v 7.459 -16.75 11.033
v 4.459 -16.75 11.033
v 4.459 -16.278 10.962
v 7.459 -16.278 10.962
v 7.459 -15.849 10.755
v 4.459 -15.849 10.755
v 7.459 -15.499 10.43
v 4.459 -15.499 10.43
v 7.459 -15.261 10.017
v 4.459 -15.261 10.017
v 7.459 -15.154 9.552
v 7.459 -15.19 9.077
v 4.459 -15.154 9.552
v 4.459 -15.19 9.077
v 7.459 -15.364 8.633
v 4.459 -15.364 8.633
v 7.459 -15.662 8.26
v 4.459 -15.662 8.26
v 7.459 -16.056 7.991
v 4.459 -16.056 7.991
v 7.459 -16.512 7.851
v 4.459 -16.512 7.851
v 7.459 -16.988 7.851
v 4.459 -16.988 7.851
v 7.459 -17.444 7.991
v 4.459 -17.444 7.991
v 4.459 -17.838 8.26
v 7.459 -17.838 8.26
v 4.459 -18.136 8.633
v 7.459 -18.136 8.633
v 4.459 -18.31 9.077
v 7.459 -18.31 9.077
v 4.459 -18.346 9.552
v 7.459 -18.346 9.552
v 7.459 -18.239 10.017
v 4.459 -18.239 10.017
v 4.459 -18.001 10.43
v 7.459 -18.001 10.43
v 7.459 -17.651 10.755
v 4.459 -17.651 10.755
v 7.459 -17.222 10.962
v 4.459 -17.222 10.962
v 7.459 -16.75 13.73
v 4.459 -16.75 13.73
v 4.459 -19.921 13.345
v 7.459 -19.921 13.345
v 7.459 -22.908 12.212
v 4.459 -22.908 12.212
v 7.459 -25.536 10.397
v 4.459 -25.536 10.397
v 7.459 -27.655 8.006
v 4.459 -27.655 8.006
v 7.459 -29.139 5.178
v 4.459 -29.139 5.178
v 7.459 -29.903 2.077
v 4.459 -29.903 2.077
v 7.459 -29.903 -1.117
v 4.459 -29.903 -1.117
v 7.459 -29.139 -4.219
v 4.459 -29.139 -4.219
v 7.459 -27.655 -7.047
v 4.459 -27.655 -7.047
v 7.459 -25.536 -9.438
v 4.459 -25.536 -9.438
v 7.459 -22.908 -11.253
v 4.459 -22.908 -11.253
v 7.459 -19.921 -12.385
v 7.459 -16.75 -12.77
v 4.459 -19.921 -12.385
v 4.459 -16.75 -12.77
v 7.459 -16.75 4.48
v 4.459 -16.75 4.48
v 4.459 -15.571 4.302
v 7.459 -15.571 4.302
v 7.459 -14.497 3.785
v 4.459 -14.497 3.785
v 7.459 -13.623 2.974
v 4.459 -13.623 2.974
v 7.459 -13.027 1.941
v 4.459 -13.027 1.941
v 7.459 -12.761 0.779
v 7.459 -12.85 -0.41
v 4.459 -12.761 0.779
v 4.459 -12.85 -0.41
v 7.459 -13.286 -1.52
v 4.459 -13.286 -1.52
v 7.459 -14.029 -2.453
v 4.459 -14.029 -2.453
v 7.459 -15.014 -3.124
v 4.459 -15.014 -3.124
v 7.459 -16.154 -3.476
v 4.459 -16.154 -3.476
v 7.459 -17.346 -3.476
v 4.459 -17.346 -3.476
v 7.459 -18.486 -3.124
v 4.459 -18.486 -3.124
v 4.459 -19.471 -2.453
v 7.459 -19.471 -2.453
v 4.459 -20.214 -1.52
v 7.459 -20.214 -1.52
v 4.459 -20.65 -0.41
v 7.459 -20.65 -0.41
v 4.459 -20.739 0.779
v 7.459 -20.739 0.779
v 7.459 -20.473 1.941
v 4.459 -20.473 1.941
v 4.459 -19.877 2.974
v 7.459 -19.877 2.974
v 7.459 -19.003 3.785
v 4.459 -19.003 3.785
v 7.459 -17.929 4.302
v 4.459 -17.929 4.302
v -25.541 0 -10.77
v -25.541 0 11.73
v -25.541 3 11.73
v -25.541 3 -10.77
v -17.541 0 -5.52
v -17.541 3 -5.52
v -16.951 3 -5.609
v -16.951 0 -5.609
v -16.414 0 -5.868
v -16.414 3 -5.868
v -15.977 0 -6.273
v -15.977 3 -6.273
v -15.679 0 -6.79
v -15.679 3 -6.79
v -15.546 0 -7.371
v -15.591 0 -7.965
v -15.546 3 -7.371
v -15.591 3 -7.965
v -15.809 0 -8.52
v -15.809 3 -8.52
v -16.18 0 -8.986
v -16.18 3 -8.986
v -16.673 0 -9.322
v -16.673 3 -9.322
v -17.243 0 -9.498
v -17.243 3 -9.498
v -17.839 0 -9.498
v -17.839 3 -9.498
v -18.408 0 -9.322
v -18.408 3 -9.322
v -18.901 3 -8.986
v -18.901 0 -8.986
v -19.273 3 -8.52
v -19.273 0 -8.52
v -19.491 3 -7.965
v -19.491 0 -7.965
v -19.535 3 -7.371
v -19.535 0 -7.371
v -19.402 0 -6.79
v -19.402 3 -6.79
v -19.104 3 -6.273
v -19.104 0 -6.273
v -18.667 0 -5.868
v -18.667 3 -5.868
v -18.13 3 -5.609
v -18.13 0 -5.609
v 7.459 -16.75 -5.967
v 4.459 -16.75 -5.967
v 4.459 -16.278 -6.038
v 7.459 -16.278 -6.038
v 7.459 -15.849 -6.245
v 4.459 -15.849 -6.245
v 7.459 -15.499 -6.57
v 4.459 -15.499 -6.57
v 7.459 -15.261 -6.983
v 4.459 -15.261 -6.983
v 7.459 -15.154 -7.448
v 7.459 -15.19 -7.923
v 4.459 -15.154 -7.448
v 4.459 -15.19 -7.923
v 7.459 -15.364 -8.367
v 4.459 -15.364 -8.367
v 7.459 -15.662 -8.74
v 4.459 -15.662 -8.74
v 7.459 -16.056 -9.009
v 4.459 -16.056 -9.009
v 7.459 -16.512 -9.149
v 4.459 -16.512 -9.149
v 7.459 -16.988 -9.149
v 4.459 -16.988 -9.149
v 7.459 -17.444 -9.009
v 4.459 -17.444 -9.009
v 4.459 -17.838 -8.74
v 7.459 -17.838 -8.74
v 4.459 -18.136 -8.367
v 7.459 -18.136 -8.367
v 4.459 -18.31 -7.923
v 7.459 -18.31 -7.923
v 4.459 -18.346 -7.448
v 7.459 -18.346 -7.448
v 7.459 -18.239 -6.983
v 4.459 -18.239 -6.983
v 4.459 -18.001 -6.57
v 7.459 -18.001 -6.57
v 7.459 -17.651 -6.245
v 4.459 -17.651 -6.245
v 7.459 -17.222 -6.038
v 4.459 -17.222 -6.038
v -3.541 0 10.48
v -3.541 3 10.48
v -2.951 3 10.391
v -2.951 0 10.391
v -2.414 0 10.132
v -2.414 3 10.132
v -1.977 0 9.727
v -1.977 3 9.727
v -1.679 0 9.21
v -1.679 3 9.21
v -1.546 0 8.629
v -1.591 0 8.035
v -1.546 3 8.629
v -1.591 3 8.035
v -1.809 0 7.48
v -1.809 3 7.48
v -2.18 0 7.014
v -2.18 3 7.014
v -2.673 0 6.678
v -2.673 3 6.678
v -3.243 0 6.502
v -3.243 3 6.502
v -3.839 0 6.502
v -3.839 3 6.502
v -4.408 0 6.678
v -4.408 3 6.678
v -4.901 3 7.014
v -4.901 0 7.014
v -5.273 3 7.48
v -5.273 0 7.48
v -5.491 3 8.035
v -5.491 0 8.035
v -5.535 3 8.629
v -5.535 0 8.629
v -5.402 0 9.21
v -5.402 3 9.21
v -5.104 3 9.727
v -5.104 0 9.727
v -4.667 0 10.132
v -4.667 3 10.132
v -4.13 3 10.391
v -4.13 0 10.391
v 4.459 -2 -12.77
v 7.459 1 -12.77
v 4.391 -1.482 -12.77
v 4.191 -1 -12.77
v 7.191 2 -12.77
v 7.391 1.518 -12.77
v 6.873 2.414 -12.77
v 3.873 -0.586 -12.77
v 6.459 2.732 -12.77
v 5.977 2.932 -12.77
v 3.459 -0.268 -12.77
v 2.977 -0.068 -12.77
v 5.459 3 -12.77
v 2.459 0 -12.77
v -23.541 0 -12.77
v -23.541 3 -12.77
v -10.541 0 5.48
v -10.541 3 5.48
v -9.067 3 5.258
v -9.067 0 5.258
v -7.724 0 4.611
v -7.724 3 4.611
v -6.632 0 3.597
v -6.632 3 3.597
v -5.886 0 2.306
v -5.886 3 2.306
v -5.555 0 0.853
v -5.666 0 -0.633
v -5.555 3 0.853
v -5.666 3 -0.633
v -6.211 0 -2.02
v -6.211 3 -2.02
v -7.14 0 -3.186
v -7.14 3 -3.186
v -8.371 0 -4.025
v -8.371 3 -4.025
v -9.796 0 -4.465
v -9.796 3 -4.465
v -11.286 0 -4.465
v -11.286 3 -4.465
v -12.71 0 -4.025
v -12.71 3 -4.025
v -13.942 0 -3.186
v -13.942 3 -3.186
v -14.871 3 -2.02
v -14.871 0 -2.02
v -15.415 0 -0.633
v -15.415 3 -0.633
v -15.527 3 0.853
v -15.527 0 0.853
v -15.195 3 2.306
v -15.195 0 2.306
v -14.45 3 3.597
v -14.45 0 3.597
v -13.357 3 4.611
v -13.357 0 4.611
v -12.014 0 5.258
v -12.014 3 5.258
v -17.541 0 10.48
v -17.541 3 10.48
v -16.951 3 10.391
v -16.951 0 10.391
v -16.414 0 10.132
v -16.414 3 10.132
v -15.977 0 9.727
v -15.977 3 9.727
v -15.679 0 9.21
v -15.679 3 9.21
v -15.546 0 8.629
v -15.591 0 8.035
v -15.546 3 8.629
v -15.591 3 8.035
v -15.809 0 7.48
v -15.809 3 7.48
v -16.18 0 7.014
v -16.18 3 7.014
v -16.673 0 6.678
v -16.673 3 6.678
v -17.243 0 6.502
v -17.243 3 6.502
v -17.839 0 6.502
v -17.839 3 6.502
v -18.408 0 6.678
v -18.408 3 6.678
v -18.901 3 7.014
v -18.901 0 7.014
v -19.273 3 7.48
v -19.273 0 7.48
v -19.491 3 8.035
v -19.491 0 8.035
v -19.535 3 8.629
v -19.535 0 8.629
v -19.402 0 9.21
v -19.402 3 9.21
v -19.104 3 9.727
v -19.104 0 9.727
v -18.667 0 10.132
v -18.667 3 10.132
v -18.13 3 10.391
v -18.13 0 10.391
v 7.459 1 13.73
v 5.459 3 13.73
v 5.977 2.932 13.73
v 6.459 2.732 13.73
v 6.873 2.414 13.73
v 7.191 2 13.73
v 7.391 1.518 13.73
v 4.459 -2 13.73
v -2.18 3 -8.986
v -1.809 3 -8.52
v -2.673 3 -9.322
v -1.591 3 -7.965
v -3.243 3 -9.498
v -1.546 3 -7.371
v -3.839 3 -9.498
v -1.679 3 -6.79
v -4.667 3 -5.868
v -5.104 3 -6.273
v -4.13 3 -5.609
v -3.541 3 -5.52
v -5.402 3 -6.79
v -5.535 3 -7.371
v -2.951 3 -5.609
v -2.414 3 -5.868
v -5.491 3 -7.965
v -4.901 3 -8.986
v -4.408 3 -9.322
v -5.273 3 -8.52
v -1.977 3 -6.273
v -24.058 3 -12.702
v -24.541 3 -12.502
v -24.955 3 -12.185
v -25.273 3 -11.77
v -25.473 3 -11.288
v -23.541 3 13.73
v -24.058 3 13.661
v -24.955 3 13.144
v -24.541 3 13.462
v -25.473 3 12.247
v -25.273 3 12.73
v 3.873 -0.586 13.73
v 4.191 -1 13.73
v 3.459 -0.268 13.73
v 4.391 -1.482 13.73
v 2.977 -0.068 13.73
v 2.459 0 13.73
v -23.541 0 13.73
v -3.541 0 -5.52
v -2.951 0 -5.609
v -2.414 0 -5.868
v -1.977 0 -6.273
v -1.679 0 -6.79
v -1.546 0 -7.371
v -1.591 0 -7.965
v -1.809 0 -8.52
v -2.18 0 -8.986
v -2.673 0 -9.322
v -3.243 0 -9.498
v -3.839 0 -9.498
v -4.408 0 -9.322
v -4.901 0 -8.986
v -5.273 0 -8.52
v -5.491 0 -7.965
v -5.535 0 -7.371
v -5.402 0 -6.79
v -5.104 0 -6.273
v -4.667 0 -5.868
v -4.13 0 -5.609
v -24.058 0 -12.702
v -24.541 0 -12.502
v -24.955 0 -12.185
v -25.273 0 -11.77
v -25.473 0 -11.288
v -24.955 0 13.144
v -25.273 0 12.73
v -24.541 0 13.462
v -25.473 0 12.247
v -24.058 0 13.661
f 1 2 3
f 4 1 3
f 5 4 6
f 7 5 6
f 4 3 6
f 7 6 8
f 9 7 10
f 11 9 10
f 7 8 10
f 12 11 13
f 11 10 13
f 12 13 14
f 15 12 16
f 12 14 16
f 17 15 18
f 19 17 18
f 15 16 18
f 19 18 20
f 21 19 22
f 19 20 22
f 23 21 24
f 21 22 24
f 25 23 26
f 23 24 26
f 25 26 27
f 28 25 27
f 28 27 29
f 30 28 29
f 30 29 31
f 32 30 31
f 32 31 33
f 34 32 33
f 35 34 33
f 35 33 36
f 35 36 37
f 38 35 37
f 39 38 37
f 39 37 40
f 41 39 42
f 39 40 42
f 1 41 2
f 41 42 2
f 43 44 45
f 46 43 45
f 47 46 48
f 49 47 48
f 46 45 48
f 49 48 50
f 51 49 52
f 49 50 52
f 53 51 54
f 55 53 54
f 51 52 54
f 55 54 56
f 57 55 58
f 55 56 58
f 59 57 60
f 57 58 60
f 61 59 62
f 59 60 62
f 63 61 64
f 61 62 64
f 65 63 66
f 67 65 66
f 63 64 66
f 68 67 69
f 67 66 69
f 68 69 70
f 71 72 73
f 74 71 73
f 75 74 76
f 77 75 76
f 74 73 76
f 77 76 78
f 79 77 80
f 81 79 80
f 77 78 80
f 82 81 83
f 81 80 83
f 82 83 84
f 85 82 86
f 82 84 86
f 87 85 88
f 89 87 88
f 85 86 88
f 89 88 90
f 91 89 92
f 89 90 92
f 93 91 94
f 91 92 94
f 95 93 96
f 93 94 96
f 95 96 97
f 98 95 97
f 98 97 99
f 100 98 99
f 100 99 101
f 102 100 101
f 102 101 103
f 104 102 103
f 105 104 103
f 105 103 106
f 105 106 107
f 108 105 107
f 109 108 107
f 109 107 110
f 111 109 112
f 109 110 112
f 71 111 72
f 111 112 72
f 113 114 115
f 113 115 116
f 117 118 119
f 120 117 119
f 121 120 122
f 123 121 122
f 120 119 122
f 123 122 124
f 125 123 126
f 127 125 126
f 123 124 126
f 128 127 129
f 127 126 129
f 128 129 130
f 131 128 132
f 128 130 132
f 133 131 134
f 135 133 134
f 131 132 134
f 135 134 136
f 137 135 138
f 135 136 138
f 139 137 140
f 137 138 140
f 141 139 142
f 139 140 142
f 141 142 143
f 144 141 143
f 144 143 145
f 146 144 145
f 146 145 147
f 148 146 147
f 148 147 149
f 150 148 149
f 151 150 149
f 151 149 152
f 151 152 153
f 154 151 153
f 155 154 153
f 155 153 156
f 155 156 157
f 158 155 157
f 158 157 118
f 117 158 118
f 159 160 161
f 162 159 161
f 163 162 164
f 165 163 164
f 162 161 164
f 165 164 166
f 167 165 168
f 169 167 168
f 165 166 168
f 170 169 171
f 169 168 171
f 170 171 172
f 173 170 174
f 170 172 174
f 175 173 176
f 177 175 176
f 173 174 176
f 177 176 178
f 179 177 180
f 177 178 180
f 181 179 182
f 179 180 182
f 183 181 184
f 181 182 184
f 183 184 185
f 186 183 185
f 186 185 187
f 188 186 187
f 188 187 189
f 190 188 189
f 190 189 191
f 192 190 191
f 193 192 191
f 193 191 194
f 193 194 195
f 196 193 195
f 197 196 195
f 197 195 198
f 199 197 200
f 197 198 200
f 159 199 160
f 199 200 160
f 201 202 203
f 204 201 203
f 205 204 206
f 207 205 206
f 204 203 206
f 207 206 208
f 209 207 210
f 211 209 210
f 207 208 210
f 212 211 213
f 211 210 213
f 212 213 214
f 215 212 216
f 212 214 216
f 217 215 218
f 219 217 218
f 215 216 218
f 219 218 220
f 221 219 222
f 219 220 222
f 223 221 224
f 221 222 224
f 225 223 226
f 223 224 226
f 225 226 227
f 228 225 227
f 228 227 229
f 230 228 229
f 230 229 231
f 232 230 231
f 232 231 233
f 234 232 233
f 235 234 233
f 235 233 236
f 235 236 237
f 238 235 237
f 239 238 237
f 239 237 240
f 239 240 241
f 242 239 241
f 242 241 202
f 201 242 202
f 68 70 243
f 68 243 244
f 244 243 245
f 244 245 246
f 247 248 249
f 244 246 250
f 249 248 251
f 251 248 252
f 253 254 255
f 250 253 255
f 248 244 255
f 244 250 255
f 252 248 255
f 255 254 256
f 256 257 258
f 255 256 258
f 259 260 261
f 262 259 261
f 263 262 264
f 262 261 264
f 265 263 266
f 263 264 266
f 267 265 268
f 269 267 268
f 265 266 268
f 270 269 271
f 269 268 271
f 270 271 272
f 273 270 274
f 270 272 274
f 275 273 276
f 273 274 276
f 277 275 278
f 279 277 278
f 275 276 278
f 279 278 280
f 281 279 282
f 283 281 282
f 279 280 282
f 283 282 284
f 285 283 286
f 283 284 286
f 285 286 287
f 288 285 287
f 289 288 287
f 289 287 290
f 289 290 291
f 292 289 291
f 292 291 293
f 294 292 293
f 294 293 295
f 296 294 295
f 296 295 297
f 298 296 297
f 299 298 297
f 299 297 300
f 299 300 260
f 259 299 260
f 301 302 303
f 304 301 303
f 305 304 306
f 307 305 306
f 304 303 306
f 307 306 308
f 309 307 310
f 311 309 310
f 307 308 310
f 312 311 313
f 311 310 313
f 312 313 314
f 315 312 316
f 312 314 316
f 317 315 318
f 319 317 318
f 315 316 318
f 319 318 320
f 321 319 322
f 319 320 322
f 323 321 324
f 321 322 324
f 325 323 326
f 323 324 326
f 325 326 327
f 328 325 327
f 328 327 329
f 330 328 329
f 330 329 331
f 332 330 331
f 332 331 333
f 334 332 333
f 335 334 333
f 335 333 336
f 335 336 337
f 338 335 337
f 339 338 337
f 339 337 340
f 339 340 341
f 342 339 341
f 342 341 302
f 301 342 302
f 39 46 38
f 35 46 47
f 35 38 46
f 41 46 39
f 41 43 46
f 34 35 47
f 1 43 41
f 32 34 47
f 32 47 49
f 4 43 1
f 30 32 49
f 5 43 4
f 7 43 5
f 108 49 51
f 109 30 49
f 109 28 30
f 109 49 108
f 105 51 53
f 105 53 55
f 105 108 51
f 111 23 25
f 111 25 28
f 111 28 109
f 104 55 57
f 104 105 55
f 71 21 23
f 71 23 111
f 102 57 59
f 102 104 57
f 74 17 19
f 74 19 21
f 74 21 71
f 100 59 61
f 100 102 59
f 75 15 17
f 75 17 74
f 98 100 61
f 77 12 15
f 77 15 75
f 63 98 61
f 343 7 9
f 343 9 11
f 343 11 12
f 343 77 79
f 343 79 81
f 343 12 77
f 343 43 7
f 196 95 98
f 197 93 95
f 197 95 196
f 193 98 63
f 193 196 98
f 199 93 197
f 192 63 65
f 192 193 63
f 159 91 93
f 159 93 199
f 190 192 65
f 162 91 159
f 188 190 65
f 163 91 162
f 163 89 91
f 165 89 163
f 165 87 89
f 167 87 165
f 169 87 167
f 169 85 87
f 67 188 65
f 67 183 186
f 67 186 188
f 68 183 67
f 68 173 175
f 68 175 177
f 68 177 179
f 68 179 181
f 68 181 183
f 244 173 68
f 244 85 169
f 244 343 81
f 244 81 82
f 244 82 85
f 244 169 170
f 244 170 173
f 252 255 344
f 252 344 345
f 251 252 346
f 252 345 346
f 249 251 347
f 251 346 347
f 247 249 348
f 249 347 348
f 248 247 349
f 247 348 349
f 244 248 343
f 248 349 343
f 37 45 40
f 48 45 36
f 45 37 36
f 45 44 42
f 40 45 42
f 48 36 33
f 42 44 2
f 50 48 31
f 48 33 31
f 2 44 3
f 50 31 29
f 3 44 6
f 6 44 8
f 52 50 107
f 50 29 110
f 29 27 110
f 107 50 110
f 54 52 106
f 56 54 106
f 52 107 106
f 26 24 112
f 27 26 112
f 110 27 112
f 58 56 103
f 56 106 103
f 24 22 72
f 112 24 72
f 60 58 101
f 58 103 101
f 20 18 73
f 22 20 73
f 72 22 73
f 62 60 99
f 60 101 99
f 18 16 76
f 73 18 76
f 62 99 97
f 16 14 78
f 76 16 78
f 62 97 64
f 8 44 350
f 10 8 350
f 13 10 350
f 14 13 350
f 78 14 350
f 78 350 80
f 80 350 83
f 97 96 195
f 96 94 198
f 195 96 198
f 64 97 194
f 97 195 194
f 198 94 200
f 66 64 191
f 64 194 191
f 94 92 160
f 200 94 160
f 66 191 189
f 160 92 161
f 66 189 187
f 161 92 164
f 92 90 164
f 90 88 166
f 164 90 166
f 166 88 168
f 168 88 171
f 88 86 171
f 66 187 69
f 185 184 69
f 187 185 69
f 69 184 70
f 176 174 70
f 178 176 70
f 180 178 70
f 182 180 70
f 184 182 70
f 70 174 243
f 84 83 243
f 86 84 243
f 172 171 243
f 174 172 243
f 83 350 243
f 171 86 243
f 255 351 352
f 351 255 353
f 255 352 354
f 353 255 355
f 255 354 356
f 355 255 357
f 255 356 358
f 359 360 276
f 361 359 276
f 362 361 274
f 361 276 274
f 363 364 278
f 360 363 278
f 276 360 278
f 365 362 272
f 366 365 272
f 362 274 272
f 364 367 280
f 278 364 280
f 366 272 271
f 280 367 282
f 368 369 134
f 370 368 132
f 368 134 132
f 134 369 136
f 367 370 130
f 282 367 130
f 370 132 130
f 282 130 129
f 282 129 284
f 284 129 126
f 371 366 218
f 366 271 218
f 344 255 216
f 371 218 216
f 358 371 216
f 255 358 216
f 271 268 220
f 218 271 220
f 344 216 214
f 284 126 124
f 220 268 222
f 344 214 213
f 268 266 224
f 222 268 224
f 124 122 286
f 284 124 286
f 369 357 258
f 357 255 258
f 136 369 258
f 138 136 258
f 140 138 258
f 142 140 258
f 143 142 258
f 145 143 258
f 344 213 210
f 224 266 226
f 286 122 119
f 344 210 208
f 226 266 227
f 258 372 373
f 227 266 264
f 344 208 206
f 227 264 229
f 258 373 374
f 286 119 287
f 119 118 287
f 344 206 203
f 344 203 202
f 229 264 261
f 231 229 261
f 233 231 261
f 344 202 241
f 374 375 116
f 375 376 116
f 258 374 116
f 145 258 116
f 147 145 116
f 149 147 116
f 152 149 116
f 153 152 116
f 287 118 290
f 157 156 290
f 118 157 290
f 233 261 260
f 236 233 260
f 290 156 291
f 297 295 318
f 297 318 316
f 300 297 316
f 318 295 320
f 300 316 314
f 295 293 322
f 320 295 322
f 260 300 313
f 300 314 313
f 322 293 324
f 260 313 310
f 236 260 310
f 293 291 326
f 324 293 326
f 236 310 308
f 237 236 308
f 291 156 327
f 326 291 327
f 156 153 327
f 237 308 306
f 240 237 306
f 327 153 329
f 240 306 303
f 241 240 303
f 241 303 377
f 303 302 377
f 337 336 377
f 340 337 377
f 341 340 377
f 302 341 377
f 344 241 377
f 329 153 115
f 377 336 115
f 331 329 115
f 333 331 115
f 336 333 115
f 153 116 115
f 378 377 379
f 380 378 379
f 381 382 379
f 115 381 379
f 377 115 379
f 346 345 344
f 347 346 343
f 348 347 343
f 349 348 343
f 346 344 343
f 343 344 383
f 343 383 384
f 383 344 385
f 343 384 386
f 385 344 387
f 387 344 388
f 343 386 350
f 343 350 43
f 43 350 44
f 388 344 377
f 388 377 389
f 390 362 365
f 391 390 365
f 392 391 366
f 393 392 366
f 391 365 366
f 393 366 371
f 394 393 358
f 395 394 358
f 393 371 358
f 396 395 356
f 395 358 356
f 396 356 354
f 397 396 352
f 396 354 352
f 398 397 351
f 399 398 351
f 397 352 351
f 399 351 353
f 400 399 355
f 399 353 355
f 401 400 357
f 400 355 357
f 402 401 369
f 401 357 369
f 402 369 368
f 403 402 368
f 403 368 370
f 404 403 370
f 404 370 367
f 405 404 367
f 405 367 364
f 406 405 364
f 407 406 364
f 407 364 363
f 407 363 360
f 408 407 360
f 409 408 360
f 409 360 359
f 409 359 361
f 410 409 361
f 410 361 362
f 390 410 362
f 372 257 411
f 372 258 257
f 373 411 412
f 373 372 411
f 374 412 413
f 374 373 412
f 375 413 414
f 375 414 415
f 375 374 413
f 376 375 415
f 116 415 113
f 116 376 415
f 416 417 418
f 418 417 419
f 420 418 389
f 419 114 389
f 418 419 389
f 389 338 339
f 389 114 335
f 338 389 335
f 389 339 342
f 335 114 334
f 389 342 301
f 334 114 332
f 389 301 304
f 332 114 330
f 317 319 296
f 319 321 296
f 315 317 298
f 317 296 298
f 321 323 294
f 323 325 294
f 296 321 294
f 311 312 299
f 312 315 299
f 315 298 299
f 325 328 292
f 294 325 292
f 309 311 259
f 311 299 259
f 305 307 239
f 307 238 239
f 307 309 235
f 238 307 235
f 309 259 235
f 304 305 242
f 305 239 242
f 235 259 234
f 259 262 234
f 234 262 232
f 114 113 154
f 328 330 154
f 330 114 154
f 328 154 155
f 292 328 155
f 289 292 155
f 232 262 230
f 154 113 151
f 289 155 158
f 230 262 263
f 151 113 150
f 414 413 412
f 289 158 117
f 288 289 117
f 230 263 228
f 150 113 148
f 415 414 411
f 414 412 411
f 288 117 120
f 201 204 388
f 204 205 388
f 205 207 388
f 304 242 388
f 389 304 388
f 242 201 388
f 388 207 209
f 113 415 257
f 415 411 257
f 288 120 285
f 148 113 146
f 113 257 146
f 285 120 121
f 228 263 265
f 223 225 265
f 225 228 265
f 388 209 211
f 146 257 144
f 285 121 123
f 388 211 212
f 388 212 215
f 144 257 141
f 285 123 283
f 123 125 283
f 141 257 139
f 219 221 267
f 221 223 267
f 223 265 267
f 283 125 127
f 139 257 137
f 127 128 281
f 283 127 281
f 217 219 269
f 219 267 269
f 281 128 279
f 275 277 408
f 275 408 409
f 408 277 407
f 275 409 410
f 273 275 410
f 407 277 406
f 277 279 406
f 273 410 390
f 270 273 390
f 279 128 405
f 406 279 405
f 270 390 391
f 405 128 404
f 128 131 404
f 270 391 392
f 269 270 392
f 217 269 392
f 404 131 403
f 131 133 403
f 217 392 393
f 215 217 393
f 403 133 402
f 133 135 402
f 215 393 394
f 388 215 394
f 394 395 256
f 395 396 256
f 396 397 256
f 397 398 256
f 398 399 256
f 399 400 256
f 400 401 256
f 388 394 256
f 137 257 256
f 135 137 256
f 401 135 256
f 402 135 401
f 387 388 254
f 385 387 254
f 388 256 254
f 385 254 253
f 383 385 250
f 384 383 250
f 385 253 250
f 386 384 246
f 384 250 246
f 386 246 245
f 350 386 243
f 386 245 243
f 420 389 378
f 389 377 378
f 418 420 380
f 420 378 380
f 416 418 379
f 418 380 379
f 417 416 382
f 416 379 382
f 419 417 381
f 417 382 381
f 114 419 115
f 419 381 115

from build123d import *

# Parameters (mm, degrees)
SKETCH_1_W          = 30
SKETCH_1_H          = 26.5
EXTRUDE_1_DEPTH     = 3
SKETCH_2_R          = 5
CUT_EXTRUDE_1_DEPTH = 30.15187029
SKETCH_3_R          = 2
CUT_EXTRUDE_2_DEPTH = 30.15187029
EXTRUDE_3_DEPTH     = 3
SKETCH_7_R          = 4
SKETCH_7_R_2        = 1.6
CUT_EXTRUDE_3_DEPTH = 3
FILLET_1_R          = 2
FILLET_2_R          = 2


with BuildPart() as part:
    # 草图1 → 凸台-拉伸1 (new body)
    with BuildSketch(Plane(origin=(0, 0, 0), x_dir=(1, 0, 0), z_dir=(0, 1, 0))):
        with Locations((-10.540723982, -0.479638009)):
            Rectangle(SKETCH_1_W, SKETCH_1_H)
    extrude(amount=EXTRUDE_1_DEPTH)

    # 草图2 → 切除-拉伸1 (cut, through all)
    with BuildSketch(Plane(origin=(0, 3, 0), x_dir=(1, 0, 0), z_dir=(0, 1, 0))):
        with Locations(Location((-10.540723982, -0.479638009, 0), (0, 0, 270))):
            Circle(SKETCH_2_R)
    extrude(amount=-CUT_EXTRUDE_1_DEPTH, mode=Mode.SUBTRACT)

    # 草图3 → 切除-拉伸2 (cut, through all)
    with BuildSketch(Plane(origin=(0, 3, 0), x_dir=(1, 0, 0), z_dir=(0, 1, 0))):
        with Locations(Location((-3.540723982, 7.520361991, 0), (0, 0, 270))):
            Circle(SKETCH_3_R)
        with Locations(Location((-17.540723982, 7.520361991, 0), (0, 0, 270))):
            Circle(SKETCH_3_R)
        with Locations(Location((-3.540723982, -8.479638009, 0), (0, 0, 270))):
            Circle(SKETCH_3_R)
        with Locations(Location((-17.540723982, -8.479638009, 0), (0, 0, 270))):
            Circle(SKETCH_3_R)
    extrude(amount=-CUT_EXTRUDE_2_DEPTH, mode=Mode.SUBTRACT)

    # 草图6 → 凸台-拉伸3 (add)
    with BuildSketch(Plane(origin=(4.459276018, 0, 0), x_dir=(0, 0, -1), z_dir=(1, 0, 0))):
        with BuildLine():
            Line((12.770361991, 3), (-13.729638009, 3))
            Line((-13.729638009, 3), (-13.729638009, -16.75))
            ThreePointArc((-13.729638009, -16.75), (-0.479638009, -30), (12.770361991, -16.75))
            Line((12.770361991, -16.75), (12.770361991, 3))
        make_face()
    extrude(amount=EXTRUDE_3_DEPTH)

    # 草图7 → 切除-拉伸3 (cut)
    with BuildSketch(Plane.ZY.offset(-4.459276018)):
        with Locations((0.479638009, -16.75)):
            Circle(SKETCH_7_R)
        with Locations((9.432771386, -16.75)):
            Circle(SKETCH_7_R_2)
        with Locations((-7.567228614, -16.75)):
            Circle(SKETCH_7_R_2)
    extrude(amount=-CUT_EXTRUDE_3_DEPTH, mode=Mode.SUBTRACT)

    # 圆角1
    fillet_1_edges = [part.edges().sort_by_distance(p)[0] for p in [
        (-25.540723982, 1.5, -12.770361991),
        (-25.540723982, 1.5, 13.729638009),
    ]]
    fillet(fillet_1_edges, radius=FILLET_1_R)

    # 圆角2
    fillet_2_edges = [part.edges().sort_by_distance(p)[0] for p in [
        (7.459276018, 3, 0.479638009),
        (4.459276018, 0, 0.479638009),
    ]]
    fillet(fillet_2_edges, radius=FILLET_2_R)


solid = part.part
